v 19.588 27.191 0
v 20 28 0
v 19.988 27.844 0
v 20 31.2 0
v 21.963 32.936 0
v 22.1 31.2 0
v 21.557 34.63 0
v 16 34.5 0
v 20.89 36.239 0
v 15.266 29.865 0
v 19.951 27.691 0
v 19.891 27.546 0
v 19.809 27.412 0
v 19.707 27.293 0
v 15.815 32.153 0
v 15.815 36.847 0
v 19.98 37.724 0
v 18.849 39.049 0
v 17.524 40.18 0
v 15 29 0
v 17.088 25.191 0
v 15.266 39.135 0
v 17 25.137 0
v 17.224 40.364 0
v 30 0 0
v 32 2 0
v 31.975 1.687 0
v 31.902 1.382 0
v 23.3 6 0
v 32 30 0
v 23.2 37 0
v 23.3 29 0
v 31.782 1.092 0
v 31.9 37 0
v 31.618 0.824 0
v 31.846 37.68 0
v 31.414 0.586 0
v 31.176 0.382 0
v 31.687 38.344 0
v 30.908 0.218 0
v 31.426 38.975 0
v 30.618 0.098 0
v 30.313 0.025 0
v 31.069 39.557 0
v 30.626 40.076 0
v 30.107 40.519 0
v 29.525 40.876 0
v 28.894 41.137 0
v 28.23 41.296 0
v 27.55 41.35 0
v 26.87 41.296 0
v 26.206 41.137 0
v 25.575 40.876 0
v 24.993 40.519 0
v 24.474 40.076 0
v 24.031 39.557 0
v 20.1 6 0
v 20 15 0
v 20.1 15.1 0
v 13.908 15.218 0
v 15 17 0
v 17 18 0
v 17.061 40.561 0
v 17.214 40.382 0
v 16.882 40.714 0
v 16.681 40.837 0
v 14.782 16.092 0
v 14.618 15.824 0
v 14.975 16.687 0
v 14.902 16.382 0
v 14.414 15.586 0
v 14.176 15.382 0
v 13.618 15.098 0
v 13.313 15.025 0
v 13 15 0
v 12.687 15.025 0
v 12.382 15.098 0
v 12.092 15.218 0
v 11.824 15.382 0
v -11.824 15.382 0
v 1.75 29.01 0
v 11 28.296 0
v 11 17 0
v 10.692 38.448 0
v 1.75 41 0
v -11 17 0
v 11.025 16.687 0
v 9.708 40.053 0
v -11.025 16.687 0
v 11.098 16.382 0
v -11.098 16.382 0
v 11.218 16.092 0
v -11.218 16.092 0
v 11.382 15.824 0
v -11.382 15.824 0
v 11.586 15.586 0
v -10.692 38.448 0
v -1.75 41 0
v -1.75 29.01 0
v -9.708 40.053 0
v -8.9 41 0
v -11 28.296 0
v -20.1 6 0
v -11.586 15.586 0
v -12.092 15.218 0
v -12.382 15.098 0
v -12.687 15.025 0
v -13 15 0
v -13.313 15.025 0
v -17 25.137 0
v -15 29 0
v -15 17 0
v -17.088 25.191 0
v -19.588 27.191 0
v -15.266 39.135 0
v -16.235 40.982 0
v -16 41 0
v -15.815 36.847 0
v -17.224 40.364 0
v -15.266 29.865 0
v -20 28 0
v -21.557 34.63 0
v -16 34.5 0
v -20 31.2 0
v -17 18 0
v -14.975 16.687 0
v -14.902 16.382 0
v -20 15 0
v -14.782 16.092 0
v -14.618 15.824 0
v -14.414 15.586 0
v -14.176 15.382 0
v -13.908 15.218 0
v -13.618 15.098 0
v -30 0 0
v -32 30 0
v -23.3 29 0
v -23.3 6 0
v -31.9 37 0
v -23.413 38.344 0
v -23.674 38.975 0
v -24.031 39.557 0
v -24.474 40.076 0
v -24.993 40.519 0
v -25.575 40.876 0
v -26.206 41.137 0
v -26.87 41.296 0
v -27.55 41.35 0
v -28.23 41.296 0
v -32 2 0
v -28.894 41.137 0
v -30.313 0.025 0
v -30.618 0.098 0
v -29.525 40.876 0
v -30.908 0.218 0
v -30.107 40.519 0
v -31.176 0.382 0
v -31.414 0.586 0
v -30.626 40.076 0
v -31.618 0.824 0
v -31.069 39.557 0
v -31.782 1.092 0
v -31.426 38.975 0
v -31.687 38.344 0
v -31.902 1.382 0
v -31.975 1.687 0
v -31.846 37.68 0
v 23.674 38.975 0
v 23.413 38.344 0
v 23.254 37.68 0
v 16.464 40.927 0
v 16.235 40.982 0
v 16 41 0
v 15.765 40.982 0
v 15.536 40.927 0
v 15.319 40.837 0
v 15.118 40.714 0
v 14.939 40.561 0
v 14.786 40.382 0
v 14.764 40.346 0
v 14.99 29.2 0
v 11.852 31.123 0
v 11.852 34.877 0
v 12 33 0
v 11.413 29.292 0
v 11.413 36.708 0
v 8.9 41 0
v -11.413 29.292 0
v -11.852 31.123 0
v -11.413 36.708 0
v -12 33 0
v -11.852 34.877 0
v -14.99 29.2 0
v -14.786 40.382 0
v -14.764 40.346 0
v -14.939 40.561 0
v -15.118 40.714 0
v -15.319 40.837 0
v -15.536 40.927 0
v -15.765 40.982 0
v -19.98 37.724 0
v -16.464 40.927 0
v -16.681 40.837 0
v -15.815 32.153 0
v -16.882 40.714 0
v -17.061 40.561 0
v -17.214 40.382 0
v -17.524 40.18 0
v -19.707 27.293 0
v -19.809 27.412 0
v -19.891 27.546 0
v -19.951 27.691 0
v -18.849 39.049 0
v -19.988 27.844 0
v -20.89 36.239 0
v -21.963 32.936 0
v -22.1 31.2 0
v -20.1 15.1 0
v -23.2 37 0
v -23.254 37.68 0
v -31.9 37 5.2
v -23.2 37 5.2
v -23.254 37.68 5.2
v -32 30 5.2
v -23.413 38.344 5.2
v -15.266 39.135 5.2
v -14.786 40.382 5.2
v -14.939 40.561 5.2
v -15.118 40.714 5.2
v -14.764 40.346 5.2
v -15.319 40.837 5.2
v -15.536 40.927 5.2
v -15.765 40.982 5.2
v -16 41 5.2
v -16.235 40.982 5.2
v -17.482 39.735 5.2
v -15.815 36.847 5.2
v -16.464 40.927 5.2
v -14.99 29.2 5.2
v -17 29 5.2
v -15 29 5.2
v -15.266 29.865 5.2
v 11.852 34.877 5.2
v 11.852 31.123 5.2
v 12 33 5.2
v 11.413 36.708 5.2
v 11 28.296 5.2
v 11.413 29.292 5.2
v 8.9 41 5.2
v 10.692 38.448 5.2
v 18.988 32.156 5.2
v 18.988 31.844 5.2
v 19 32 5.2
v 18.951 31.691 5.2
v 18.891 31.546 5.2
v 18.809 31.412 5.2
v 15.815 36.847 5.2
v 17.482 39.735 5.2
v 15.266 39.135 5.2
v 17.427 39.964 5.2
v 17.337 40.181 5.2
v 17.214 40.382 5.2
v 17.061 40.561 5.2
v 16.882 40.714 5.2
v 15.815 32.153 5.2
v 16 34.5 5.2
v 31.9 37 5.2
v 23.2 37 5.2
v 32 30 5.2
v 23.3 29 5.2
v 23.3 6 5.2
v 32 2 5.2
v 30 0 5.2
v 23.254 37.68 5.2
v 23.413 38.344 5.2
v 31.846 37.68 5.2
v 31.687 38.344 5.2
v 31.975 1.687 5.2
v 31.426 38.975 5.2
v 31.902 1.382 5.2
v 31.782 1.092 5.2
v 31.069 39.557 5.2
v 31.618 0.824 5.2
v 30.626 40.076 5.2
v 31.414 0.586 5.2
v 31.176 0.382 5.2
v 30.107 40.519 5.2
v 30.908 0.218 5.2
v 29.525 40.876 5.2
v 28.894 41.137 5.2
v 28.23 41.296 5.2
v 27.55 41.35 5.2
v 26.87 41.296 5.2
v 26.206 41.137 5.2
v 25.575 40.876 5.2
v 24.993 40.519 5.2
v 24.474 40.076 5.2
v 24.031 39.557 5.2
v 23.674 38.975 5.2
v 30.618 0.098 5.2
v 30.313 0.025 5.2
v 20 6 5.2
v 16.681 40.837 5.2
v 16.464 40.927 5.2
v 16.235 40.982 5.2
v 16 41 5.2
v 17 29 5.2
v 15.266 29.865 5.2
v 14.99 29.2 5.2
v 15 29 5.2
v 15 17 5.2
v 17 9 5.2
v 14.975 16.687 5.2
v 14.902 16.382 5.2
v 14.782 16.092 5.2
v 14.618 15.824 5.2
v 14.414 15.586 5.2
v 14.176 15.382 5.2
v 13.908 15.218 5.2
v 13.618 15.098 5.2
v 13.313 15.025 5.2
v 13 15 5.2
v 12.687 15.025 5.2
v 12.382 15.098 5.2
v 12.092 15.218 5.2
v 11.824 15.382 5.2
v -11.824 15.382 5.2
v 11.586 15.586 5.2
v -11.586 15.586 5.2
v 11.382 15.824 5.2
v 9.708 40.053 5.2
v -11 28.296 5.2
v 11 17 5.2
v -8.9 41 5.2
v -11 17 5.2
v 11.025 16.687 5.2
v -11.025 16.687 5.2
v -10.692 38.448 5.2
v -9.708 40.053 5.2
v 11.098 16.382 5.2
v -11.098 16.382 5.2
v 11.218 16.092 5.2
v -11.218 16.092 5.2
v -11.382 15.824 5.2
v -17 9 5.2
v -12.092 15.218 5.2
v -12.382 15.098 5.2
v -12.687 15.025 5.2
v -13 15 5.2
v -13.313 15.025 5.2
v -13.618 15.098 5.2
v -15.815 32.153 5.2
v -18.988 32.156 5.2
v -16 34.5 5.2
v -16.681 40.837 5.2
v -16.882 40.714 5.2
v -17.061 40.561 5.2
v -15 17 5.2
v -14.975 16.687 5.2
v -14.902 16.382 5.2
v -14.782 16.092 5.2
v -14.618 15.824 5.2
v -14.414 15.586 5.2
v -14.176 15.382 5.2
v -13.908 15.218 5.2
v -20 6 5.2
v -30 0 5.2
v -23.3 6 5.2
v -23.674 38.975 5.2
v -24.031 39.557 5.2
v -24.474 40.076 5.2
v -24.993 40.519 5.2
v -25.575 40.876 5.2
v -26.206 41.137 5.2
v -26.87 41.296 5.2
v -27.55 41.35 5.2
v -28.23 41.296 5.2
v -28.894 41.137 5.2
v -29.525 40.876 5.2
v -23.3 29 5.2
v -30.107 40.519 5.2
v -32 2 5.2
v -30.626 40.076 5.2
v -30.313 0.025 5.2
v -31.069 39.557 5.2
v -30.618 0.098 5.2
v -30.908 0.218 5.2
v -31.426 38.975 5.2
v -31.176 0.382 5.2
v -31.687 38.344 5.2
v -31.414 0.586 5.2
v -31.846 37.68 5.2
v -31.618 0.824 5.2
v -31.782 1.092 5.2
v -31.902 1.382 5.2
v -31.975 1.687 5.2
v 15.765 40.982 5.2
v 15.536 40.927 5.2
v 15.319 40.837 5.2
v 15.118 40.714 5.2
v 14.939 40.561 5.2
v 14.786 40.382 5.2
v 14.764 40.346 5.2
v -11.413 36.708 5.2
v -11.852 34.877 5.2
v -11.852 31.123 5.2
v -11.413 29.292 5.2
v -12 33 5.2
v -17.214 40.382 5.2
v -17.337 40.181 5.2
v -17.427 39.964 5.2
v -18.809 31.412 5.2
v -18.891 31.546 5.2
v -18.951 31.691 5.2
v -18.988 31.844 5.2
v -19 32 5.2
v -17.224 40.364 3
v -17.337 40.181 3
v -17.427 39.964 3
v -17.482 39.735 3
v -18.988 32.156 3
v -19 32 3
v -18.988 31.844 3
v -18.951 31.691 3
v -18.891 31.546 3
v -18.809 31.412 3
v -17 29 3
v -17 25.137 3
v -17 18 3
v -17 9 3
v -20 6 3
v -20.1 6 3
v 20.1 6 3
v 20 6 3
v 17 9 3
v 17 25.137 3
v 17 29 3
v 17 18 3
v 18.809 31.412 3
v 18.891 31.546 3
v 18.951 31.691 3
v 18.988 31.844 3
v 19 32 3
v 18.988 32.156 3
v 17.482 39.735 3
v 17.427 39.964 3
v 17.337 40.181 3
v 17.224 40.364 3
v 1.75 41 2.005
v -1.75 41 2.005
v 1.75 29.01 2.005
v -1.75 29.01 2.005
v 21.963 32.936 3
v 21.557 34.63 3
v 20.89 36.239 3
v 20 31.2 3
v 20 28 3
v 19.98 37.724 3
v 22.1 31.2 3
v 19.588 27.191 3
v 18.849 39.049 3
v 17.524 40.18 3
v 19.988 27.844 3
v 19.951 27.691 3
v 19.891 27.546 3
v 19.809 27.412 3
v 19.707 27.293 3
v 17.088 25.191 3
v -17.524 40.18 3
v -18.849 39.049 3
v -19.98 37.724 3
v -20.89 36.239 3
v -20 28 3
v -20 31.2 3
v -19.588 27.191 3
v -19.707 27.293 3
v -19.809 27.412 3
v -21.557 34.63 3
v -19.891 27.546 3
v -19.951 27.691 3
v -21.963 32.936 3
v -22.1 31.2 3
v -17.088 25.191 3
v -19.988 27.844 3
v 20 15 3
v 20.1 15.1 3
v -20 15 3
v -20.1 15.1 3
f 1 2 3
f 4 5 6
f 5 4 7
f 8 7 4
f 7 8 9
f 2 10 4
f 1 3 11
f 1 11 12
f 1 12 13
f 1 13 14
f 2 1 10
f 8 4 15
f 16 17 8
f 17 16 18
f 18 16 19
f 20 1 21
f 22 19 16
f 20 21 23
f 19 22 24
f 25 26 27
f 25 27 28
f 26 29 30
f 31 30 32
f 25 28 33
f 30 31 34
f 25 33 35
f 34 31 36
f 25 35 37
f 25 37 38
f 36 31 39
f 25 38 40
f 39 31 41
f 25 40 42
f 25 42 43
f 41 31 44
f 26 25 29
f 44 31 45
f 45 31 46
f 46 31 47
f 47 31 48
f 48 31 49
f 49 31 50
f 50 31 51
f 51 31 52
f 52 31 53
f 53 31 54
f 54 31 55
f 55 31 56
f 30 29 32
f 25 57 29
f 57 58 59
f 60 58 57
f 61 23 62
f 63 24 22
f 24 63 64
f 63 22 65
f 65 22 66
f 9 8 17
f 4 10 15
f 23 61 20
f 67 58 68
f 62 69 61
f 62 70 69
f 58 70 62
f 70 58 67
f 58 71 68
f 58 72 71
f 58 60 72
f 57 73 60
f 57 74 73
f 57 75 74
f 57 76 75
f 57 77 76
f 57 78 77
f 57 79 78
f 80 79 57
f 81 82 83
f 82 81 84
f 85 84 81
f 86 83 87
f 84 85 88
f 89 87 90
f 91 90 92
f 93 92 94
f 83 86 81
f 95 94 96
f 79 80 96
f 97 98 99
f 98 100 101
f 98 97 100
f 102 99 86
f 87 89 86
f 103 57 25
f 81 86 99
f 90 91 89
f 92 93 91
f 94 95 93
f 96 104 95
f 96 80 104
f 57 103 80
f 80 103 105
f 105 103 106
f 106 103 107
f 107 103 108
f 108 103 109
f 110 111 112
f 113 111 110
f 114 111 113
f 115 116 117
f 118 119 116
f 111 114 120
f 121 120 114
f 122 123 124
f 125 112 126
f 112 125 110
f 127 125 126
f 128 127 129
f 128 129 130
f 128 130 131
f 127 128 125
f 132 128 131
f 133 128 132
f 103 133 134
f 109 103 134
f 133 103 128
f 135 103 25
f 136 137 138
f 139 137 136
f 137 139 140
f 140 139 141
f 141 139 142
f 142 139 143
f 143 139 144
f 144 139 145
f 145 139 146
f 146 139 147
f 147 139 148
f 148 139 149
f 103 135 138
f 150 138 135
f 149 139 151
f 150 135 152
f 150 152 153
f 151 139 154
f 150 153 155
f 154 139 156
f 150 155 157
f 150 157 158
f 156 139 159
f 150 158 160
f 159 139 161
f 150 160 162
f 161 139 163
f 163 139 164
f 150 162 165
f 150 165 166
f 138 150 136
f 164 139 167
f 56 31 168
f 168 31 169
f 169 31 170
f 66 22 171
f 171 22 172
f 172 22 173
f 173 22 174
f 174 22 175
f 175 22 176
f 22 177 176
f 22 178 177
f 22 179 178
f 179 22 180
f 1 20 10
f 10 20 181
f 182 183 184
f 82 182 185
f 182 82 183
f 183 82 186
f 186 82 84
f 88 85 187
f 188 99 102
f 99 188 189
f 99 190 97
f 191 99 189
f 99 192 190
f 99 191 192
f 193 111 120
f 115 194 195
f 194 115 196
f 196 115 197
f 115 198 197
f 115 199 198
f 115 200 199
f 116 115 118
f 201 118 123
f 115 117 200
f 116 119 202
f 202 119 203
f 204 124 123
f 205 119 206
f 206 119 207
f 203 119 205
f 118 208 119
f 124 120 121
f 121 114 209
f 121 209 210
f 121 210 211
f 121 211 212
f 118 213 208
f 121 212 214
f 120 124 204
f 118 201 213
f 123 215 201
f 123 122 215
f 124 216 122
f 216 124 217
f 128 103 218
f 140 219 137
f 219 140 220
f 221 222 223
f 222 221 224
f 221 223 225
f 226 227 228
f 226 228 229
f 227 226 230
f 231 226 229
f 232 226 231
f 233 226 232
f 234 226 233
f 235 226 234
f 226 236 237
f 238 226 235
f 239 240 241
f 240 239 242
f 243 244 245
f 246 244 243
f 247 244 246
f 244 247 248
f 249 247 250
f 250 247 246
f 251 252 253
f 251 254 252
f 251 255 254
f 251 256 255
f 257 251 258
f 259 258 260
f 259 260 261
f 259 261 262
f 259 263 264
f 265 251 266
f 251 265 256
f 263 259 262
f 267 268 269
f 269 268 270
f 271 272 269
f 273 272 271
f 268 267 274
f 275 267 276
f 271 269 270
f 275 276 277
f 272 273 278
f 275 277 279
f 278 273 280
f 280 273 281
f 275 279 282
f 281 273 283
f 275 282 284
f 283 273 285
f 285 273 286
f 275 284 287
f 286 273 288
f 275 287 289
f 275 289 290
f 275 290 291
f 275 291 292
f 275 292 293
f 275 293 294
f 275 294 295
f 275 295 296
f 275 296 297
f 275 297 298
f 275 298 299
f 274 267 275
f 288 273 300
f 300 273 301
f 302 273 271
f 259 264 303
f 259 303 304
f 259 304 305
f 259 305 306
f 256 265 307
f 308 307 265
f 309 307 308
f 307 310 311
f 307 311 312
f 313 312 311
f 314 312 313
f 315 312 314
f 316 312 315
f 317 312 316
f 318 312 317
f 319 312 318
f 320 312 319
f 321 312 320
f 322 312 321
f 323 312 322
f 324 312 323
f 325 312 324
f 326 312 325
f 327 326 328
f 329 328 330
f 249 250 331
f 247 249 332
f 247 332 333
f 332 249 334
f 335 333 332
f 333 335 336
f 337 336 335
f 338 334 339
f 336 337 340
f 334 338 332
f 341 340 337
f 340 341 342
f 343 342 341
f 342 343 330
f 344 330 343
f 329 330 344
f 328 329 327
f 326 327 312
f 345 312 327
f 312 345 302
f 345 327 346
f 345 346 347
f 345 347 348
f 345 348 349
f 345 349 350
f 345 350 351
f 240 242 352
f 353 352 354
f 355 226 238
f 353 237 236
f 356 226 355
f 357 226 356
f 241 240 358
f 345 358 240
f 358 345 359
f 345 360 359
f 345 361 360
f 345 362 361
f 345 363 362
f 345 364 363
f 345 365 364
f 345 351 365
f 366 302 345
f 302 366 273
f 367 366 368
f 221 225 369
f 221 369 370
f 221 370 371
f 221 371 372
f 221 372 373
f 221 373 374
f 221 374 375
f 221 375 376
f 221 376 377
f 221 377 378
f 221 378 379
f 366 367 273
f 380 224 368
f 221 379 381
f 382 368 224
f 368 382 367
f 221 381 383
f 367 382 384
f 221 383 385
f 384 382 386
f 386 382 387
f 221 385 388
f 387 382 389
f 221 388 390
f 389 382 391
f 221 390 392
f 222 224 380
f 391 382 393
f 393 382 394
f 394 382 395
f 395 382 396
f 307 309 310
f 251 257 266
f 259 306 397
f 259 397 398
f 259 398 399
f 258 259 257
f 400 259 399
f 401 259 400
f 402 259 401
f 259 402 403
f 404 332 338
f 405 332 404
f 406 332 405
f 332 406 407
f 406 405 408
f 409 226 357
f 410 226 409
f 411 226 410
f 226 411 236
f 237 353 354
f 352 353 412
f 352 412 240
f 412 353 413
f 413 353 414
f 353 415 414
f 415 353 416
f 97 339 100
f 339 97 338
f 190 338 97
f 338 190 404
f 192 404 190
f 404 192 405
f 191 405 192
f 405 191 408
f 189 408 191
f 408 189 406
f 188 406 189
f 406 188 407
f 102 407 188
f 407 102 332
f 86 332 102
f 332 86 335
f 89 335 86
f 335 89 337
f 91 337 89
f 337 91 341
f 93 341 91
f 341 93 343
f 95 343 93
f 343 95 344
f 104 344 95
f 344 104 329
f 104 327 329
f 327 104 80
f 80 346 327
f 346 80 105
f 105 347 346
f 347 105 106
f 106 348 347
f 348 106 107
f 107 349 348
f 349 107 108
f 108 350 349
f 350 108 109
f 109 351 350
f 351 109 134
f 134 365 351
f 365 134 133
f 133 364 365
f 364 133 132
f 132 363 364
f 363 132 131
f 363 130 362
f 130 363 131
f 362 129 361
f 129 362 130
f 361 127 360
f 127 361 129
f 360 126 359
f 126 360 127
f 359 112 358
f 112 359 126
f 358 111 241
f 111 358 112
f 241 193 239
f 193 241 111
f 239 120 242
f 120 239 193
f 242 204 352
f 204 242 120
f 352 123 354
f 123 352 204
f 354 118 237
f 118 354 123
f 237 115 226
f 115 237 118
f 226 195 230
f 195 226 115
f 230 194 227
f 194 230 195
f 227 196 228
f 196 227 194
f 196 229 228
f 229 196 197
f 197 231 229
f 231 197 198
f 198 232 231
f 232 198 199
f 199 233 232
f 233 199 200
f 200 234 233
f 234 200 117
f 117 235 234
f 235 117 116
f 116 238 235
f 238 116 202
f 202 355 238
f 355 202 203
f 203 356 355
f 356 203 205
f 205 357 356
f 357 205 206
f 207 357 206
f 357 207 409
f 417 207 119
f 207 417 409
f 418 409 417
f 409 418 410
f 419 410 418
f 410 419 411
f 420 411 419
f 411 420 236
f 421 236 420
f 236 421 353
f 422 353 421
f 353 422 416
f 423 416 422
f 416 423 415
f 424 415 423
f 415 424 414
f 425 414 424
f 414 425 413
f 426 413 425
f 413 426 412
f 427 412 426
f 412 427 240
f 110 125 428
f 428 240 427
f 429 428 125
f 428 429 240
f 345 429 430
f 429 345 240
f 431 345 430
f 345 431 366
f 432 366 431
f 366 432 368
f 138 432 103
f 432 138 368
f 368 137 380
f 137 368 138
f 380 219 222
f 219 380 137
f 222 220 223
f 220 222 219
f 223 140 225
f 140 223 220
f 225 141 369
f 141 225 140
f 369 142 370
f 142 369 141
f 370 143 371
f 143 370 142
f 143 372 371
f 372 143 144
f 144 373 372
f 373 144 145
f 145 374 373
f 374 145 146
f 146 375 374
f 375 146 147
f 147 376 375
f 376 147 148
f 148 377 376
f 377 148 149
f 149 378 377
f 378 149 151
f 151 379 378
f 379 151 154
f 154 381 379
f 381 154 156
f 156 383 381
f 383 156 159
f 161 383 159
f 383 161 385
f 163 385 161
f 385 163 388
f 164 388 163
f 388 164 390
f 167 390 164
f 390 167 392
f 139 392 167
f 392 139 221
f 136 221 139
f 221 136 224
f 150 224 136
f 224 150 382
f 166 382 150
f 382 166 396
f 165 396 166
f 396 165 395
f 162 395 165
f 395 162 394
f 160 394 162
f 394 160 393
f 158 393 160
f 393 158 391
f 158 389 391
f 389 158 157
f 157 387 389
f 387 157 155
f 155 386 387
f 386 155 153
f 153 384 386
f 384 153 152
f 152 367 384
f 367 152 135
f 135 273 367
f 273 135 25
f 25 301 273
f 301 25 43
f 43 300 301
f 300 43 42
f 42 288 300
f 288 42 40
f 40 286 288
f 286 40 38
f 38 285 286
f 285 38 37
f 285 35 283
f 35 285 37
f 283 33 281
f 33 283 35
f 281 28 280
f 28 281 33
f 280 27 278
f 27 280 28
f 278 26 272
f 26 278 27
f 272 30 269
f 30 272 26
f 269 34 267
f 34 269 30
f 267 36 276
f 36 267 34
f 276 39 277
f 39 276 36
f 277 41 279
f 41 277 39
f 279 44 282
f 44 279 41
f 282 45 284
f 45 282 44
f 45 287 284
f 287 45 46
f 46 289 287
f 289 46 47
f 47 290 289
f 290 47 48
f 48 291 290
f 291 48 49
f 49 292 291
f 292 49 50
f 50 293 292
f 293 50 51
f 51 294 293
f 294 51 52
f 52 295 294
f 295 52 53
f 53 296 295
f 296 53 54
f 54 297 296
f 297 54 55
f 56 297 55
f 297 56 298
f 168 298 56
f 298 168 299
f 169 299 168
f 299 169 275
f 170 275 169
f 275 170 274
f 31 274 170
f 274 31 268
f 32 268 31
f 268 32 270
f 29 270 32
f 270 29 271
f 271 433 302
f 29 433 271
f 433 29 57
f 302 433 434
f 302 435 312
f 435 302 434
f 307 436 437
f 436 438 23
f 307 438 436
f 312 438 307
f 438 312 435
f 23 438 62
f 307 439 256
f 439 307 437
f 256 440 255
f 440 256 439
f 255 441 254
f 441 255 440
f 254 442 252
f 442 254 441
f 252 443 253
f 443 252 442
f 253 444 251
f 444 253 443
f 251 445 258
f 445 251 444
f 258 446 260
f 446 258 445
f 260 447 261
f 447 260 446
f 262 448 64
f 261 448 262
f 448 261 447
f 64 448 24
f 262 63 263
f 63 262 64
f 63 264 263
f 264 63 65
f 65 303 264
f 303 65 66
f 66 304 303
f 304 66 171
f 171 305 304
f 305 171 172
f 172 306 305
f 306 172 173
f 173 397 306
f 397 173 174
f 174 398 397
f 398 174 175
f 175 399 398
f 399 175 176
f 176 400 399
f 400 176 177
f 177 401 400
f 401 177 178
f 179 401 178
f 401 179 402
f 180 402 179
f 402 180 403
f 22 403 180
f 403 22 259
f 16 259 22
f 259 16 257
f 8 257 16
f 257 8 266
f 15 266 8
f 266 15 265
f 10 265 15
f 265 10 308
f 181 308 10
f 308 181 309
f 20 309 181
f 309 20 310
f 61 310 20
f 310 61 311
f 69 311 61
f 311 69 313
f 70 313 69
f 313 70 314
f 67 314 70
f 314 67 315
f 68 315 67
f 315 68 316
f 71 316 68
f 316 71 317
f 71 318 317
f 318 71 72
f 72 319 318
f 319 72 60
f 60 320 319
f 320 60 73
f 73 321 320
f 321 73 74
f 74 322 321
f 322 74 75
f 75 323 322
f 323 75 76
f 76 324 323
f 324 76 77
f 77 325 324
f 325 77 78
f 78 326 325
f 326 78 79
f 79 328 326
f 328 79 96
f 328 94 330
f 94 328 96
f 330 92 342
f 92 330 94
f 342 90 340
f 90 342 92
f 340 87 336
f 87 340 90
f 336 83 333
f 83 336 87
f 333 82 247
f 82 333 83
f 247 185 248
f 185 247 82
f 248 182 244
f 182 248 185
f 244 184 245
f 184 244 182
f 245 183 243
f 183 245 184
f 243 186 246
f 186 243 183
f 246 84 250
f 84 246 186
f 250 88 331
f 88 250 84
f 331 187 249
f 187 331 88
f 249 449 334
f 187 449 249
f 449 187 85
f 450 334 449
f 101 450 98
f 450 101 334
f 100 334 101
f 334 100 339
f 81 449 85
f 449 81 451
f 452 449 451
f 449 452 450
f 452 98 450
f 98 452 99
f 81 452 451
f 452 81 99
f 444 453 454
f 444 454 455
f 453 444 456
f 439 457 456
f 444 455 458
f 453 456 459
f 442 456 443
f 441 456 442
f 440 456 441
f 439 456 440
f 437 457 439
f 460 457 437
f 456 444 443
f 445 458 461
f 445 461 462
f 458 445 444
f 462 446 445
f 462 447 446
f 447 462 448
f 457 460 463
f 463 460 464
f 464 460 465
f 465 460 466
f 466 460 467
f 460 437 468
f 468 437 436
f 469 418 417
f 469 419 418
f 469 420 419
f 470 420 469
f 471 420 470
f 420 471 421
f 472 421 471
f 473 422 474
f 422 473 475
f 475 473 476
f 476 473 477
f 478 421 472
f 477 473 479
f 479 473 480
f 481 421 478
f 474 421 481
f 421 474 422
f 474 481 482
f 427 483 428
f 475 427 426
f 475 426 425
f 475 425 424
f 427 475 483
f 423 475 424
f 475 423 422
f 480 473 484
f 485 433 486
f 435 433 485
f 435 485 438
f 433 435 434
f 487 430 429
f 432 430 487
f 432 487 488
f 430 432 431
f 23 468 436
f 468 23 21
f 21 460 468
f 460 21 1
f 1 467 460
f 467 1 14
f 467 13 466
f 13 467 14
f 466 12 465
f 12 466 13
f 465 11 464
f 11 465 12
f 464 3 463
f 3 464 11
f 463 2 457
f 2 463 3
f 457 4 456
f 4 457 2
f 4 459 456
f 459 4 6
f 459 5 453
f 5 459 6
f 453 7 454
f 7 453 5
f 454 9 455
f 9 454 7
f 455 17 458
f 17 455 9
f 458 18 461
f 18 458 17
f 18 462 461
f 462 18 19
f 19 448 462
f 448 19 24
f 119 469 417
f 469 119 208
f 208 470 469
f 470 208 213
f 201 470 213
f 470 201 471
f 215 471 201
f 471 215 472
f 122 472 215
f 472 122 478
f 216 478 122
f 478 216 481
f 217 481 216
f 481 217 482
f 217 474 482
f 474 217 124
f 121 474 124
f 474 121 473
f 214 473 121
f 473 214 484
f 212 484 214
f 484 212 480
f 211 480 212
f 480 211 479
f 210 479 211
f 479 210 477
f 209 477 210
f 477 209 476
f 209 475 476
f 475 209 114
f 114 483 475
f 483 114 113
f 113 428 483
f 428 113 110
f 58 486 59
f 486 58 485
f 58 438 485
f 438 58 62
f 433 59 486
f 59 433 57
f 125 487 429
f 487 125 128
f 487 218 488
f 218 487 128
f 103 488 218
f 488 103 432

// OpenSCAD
$fn = 40;

module top() {
	difference() {
		hull() {
			translate([30, 2]) circle(2);
			translate([30, 27]) square(4, center=true);
			translate([2, 2]) square(4, center=true);
			translate([2, 27]) square(4, center=true);
		}
		translate([13, 15]) clipHole();
		translate([17, 6]) sideHole();
	}
	hull() {
		translate([23.3, 29]) square([8.7, 1]);
		translate([23.3+8.5/2, 37]) circle(d=8.7);
	}

	difference() {
		translate([0, 33]) circle(12);
		translate([-30, 25]) square(30);
		translate([0, 41]) square(20);
	}

	translate([17, 29]) leg();
}

module bottom() {
	difference() {
		translate([16.1, 6]) square([4, 12]);
		translate([20, 15]) rotate([0, 0, 45]) square(6);
	}

	translate([11, 31.2]) intersection() {
		circle(11.1);
		translate([5.5, 0]) square(20);
	}

	translate([16, 26]) hull() {
		translate([0.5, 0]) circle(1);
		translate([3, 2]) circle(1);
		translate([3, 6]) circle(1);
	}
}

module clipHole() {
	hull() {
		translate([0, 2]) circle(2);
		translate([0, 20]) square(4, center=true);
	}
}

module sideHole() {
	intersection() {
		square([6.3, 30]);
		translate([10, -7]) rotate([0, 0, 45]) square(30); 
	}
}

module leg() {
	difference() {
		hull() {
			translate([-1, 10.5]) circle(1.5);
			translate([1, 3]) circle(1);
			translate([-2, 0]) square(2);
		}
		translate([-16, 5.5]) circle(15);
	}
}

module clipper() {
	difference() {
		linear_extrude(5.2) {
			top();
			mirror([1, 0, 0]) top();
		}
		translate([0, 35.01, 1]) cube([3.5, 12, 2.01], center=true);
	}

	linear_extrude(3) {
		bottom();
		mirror([1, 0, 0]) bottom();
	}
}

clipper();
